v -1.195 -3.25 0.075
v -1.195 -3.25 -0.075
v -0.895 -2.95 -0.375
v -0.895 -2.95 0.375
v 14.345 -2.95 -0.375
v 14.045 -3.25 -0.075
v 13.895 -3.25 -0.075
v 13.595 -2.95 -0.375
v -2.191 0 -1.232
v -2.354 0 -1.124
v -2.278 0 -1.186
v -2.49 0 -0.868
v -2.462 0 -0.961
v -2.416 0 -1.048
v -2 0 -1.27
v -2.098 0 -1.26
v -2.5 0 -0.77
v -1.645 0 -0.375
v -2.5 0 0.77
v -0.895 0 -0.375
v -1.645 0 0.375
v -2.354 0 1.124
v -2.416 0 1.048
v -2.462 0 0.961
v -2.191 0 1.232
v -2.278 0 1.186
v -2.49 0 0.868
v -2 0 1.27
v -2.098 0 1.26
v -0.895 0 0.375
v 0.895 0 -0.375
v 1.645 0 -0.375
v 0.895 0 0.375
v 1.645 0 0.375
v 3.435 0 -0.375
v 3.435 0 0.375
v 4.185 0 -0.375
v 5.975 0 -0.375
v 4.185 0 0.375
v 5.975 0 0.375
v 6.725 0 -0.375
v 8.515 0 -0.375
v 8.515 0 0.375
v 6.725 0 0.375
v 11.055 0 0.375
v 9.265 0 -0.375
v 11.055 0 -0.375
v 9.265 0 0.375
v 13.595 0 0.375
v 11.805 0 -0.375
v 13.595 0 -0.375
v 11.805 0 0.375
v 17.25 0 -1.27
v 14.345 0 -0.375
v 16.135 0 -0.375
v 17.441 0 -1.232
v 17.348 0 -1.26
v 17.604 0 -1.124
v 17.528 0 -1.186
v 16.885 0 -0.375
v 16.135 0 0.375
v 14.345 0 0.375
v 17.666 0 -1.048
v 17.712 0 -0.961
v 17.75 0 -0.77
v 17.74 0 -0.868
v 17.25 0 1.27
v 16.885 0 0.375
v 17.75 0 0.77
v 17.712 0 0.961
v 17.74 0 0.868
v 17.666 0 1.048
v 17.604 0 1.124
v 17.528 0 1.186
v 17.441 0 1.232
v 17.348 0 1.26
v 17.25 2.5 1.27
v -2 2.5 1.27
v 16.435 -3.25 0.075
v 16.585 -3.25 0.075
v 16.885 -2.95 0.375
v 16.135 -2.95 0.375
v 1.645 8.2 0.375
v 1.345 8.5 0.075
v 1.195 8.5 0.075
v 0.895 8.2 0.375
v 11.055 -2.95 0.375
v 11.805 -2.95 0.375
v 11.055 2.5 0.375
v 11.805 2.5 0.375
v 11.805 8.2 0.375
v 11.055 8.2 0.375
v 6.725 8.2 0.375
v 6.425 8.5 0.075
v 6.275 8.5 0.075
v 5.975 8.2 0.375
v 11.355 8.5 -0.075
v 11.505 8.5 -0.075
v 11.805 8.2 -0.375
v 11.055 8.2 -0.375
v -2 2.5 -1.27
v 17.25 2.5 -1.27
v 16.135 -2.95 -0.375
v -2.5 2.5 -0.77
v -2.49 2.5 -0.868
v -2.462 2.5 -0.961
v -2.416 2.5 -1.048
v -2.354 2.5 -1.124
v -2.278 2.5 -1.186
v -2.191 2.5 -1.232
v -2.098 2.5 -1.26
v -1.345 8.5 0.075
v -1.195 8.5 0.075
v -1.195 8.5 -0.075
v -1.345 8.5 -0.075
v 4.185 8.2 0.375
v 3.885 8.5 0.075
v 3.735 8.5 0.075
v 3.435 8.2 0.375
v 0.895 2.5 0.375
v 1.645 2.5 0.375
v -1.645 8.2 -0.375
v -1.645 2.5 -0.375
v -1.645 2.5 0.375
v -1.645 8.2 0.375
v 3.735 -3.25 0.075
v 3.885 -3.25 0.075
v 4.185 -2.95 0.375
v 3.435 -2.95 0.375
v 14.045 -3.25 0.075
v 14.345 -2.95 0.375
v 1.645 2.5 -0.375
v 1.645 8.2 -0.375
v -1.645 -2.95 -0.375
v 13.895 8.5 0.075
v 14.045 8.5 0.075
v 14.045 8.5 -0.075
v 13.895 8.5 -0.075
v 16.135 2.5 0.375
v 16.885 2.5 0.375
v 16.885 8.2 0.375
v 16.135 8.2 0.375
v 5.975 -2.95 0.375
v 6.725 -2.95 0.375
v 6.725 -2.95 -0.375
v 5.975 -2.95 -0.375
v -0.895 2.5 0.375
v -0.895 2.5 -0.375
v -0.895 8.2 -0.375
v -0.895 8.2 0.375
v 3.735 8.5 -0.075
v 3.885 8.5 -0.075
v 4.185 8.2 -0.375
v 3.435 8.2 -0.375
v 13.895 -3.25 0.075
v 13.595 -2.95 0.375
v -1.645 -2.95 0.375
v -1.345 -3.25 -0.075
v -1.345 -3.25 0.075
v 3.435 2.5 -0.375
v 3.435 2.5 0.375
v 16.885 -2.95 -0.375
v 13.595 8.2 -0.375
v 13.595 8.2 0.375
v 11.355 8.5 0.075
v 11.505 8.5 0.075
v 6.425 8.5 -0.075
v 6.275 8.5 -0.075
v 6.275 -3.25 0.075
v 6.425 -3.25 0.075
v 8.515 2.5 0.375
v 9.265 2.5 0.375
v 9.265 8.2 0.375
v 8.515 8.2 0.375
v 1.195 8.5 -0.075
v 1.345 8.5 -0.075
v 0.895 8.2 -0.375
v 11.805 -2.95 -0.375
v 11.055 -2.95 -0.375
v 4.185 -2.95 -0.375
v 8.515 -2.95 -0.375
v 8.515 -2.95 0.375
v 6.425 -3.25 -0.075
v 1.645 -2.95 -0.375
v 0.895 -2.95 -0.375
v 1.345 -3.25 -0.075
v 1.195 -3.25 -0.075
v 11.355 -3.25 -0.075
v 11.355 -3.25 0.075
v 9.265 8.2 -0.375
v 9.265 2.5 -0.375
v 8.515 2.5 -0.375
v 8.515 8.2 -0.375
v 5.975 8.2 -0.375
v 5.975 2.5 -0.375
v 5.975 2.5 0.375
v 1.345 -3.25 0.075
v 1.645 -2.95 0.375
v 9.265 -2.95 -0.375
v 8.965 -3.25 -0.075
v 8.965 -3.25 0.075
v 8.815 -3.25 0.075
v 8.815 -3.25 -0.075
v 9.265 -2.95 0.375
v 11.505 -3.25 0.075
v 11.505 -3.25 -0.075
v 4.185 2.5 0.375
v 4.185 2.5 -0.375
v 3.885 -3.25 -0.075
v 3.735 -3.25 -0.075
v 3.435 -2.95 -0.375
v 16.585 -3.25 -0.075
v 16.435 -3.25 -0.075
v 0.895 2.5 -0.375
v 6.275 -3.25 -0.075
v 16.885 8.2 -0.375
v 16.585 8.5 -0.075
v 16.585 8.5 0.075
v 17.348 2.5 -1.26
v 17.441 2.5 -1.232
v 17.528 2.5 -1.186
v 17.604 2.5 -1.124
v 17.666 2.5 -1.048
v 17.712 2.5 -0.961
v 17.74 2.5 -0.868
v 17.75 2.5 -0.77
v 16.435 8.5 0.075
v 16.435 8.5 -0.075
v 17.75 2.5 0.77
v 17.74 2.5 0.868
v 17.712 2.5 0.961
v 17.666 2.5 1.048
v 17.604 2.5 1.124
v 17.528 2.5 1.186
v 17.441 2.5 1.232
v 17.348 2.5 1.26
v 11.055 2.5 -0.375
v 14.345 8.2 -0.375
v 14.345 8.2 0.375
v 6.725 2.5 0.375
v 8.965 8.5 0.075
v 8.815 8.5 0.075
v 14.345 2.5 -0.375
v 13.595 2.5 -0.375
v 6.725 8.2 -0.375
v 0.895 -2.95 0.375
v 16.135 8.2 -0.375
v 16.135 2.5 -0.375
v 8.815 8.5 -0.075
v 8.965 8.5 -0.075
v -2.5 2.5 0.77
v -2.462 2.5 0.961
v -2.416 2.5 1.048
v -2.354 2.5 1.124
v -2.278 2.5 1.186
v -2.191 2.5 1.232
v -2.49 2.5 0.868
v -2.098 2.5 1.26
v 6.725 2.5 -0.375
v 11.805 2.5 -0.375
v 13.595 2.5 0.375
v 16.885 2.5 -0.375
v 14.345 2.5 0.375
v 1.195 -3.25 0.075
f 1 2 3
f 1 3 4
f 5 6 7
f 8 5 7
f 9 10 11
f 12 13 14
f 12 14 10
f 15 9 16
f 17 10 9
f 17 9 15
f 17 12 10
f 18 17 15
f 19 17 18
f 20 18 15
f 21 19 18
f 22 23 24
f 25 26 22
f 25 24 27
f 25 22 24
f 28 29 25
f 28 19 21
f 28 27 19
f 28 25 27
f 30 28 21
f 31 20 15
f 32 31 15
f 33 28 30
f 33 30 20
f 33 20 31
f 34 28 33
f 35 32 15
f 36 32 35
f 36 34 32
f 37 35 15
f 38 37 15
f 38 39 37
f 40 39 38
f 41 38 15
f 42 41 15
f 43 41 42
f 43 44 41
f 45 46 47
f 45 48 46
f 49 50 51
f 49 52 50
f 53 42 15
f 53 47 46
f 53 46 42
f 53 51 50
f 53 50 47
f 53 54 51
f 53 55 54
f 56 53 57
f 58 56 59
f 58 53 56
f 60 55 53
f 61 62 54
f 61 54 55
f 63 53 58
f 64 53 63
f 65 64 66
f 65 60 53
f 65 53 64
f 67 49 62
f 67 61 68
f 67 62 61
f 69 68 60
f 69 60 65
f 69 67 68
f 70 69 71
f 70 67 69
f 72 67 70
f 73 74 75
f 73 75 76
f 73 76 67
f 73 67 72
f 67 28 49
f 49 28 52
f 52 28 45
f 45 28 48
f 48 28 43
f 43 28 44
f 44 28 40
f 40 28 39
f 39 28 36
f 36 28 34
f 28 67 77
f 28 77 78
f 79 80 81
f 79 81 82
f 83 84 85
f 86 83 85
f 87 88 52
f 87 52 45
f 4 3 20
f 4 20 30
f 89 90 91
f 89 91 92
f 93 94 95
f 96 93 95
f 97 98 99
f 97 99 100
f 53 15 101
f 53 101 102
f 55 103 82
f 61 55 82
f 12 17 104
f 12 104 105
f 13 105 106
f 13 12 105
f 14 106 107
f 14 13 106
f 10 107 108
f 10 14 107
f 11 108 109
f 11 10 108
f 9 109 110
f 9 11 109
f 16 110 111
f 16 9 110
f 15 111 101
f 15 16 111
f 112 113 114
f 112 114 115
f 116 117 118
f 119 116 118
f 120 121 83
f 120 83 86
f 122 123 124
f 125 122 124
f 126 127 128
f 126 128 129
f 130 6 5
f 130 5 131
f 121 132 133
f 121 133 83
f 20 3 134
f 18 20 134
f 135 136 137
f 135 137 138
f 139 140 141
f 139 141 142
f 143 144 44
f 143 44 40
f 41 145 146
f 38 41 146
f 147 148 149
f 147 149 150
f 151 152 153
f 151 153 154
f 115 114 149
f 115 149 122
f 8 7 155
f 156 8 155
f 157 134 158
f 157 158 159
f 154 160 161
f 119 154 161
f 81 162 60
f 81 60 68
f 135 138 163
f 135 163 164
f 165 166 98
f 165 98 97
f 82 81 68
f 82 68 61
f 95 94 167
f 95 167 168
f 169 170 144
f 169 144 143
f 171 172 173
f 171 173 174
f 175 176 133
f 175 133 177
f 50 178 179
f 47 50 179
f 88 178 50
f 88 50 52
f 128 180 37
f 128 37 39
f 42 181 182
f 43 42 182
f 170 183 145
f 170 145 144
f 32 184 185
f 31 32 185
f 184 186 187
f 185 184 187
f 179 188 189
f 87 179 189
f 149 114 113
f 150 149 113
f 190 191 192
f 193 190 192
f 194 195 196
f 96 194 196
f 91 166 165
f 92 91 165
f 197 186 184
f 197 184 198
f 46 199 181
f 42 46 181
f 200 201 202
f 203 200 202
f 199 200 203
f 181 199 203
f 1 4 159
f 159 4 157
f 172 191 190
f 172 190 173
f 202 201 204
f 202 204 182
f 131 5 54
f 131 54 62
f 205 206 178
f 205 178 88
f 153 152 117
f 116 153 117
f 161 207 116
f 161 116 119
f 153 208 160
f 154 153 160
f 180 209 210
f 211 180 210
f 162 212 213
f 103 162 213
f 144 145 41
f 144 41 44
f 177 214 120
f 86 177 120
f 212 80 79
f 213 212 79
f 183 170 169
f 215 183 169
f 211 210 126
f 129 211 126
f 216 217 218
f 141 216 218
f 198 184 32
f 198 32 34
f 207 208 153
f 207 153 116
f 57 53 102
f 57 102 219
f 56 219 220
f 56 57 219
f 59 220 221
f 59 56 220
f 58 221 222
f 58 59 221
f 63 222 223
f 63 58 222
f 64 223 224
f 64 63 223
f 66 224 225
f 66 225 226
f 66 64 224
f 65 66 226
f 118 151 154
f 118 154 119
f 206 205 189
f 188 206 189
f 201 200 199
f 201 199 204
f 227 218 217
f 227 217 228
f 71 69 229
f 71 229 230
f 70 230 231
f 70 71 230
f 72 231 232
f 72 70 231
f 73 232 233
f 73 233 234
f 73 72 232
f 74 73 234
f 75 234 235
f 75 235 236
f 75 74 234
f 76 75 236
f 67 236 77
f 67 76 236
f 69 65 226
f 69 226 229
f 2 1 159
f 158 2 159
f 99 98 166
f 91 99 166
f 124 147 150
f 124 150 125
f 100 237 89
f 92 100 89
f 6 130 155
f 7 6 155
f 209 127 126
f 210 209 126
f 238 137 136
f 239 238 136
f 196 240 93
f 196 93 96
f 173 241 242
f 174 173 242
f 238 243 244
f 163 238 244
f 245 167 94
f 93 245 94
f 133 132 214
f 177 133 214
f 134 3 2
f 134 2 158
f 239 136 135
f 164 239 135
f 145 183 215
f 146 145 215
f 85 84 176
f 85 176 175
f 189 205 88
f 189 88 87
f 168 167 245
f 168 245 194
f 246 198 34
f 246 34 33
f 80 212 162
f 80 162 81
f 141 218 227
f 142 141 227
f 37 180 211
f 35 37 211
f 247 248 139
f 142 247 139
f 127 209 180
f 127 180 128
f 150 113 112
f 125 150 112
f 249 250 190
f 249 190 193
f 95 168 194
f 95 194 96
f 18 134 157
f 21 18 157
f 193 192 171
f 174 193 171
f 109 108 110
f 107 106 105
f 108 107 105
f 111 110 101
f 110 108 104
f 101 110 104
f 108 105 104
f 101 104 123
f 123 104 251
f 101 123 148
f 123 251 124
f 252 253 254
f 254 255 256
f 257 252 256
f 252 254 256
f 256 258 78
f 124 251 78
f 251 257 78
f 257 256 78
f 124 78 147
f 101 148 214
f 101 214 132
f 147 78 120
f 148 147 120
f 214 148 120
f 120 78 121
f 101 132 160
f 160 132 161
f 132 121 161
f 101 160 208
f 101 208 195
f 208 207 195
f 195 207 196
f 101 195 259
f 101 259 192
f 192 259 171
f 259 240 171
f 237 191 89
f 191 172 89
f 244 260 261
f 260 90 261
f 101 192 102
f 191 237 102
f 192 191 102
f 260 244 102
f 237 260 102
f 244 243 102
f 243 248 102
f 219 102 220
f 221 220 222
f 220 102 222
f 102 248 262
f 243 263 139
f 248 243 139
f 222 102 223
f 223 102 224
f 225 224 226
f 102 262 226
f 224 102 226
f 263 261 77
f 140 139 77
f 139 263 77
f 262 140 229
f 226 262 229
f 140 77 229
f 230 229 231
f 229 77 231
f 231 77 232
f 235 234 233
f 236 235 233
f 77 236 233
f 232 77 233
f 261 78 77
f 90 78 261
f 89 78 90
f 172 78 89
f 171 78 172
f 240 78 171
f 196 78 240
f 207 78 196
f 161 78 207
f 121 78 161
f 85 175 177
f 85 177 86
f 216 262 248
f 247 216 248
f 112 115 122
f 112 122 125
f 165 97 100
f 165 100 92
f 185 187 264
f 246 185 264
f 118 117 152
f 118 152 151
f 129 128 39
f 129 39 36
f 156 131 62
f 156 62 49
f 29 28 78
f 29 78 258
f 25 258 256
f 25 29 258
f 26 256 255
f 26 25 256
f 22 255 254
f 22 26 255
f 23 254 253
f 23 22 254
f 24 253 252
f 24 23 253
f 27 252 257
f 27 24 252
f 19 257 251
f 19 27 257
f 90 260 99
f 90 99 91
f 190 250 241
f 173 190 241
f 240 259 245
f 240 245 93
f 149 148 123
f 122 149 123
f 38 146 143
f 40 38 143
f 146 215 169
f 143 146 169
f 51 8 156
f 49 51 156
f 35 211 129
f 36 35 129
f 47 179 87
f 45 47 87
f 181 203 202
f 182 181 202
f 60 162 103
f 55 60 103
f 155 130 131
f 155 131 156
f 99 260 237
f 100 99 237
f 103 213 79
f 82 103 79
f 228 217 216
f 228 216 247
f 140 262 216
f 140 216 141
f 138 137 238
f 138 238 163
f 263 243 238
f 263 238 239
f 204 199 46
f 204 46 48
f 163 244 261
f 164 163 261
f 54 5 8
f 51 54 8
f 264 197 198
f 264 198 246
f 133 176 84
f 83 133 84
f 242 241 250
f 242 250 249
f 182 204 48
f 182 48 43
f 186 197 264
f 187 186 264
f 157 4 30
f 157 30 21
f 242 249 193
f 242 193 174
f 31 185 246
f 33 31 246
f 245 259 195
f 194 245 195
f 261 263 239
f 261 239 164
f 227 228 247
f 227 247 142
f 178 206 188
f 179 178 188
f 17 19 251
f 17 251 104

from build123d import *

# Parameters (mm, degrees)
BOSS_EXTRUDE1_DEPTH      = 2.5
BOSS_EXTRUDE2_DEPTH      = 8.5
BOSS_EXTRUDE2_DEPTH_BACK = 3.25
SKETCH2_W                = 0.75
SKETCH2_H                = 0.75
CHAMFER1_SIZE            = 0.3


with BuildPart() as part:
    # Sketch1 → Boss-Extrude1 (new body)
    with BuildSketch(Plane(origin=(0, 0, 0), x_dir=(-1, 0, 0), z_dir=(0, 1, 0))):
        with BuildLine():
            Line((-17.25, 1.27), (2, 1.27))
            ThreePointArc((2, 1.27), (2.353553391, 1.123553391), (2.5, 0.77))
            Line((2.5, 0.77), (2.5, -0.77))
            ThreePointArc((2.5, -0.77), (2.353553391, -1.123553391), (2, -1.27))
            Line((2, -1.27), (-17.25, -1.27))
            ThreePointArc((-17.25, -1.27), (-17.603553391, -1.123553391), (-17.75, -0.77))
            Line((-17.75, -0.77), (-17.75, 0.77))
            ThreePointArc((-17.75, 0.77), (-17.603553391, 1.123553391), (-17.25, 1.27))
        make_face()
    extrude(amount=BOSS_EXTRUDE1_DEPTH)

    # Sketch2 → Boss-Extrude2 (add, two sides: drawn at the far end of the back side and taken through both)
    with BuildSketch(Plane(origin=(0, 0, 0), x_dir=(-1, 0, 0), z_dir=(0, 1, 0)).offset(-BOSS_EXTRUDE2_DEPTH_BACK)):
        with Locations((1.27, 0)):
            Rectangle(SKETCH2_W, SKETCH2_H)
        with Locations((-1.27, 0)):
            Rectangle(SKETCH2_W, SKETCH2_H)
        with Locations((-3.81, 0)):
            Rectangle(SKETCH2_W, SKETCH2_H)
        with Locations((-6.35, 0)):
            Rectangle(SKETCH2_W, SKETCH2_H)
        with Locations((-8.89, 0)):
            Rectangle(SKETCH2_W, SKETCH2_H)
        with Locations((-11.43, 0)):
            Rectangle(SKETCH2_W, SKETCH2_H)
        with Locations((-13.97, 0)):
            Rectangle(SKETCH2_W, SKETCH2_H)
        with Locations((-16.51, 0)):
            Rectangle(SKETCH2_W, SKETCH2_H)
    extrude(amount=BOSS_EXTRUDE2_DEPTH + BOSS_EXTRUDE2_DEPTH_BACK)

    # Chamfer1
    chamfer1_edges = [part.edges().sort_by_distance(p)[0] for p in [
        (9.265, -3.25, 0),
        (8.89, -3.25, 0.375),
        (8.515, -3.25, 0),
        (8.89, -3.25, -0.375),
        (9.265, 8.5, 0),
        (8.89, 8.5, -0.375),
        (8.515, 8.5, 0),
        (8.89, 8.5, 0.375),
        (11.055, -3.25, 0),
        (11.43, -3.25, -0.375),
        (11.805, -3.25, 0),
        (11.43, -3.25, 0.375),
        (11.055, 8.5, 0),
        (11.43, 8.5, 0.375),
        (11.805, 8.5, 0),
        (11.43, 8.5, -0.375),
        (14.345, -3.25, 0),
        (13.97, -3.25, 0.375),
        (13.595, -3.25, 0),
        (13.97, -3.25, -0.375),
        (14.345, 8.5, 0),
        (13.97, 8.5, -0.375),
        (13.595, 8.5, 0),
        (13.97, 8.5, 0.375),
        (16.135, -3.25, 0),
        (16.51, -3.25, -0.375),
        (16.885, -3.25, 0),
        (16.51, -3.25, 0.375),
        (16.135, 8.5, 0),
        (16.51, 8.5, 0.375),
        (16.885, 8.5, 0),
        (16.51, 8.5, -0.375),
        (-0.895, -3.25, 0),
        (-1.27, -3.25, 0.375),
        (-1.645, -3.25, 0),
        (-1.27, -3.25, -0.375),
        (-0.895, 8.5, 0),
        (-1.27, 8.5, -0.375),
        (-1.645, 8.5, 0),
        (-1.27, 8.5, 0.375),
        (0.895, -3.25, 0),
        (1.27, -3.25, -0.375),
        (1.645, -3.25, 0),
        (1.27, -3.25, 0.375),
        (0.895, 8.5, 0),
        (1.27, 8.5, 0.375),
        (1.645, 8.5, 0),
        (1.27, 8.5, -0.375),
        (4.185, -3.25, 0),
        (3.81, -3.25, 0.375),
        (3.435, -3.25, 0),
        (3.81, -3.25, -0.375),
        (4.185, 8.5, 0),
        (3.81, 8.5, -0.375),
        (3.435, 8.5, 0),
        (3.81, 8.5, 0.375),
        (5.975, -3.25, 0),
        (6.35, -3.25, -0.375),
        (6.725, -3.25, 0),
        (6.35, -3.25, 0.375),
        (5.975, 8.5, 0),
        (6.35, 8.5, 0.375),
        (6.725, 8.5, 0),
        (6.35, 8.5, -0.375),
    ]]
    chamfer(chamfer1_edges, length=CHAMFER1_SIZE)


solid = part.part
